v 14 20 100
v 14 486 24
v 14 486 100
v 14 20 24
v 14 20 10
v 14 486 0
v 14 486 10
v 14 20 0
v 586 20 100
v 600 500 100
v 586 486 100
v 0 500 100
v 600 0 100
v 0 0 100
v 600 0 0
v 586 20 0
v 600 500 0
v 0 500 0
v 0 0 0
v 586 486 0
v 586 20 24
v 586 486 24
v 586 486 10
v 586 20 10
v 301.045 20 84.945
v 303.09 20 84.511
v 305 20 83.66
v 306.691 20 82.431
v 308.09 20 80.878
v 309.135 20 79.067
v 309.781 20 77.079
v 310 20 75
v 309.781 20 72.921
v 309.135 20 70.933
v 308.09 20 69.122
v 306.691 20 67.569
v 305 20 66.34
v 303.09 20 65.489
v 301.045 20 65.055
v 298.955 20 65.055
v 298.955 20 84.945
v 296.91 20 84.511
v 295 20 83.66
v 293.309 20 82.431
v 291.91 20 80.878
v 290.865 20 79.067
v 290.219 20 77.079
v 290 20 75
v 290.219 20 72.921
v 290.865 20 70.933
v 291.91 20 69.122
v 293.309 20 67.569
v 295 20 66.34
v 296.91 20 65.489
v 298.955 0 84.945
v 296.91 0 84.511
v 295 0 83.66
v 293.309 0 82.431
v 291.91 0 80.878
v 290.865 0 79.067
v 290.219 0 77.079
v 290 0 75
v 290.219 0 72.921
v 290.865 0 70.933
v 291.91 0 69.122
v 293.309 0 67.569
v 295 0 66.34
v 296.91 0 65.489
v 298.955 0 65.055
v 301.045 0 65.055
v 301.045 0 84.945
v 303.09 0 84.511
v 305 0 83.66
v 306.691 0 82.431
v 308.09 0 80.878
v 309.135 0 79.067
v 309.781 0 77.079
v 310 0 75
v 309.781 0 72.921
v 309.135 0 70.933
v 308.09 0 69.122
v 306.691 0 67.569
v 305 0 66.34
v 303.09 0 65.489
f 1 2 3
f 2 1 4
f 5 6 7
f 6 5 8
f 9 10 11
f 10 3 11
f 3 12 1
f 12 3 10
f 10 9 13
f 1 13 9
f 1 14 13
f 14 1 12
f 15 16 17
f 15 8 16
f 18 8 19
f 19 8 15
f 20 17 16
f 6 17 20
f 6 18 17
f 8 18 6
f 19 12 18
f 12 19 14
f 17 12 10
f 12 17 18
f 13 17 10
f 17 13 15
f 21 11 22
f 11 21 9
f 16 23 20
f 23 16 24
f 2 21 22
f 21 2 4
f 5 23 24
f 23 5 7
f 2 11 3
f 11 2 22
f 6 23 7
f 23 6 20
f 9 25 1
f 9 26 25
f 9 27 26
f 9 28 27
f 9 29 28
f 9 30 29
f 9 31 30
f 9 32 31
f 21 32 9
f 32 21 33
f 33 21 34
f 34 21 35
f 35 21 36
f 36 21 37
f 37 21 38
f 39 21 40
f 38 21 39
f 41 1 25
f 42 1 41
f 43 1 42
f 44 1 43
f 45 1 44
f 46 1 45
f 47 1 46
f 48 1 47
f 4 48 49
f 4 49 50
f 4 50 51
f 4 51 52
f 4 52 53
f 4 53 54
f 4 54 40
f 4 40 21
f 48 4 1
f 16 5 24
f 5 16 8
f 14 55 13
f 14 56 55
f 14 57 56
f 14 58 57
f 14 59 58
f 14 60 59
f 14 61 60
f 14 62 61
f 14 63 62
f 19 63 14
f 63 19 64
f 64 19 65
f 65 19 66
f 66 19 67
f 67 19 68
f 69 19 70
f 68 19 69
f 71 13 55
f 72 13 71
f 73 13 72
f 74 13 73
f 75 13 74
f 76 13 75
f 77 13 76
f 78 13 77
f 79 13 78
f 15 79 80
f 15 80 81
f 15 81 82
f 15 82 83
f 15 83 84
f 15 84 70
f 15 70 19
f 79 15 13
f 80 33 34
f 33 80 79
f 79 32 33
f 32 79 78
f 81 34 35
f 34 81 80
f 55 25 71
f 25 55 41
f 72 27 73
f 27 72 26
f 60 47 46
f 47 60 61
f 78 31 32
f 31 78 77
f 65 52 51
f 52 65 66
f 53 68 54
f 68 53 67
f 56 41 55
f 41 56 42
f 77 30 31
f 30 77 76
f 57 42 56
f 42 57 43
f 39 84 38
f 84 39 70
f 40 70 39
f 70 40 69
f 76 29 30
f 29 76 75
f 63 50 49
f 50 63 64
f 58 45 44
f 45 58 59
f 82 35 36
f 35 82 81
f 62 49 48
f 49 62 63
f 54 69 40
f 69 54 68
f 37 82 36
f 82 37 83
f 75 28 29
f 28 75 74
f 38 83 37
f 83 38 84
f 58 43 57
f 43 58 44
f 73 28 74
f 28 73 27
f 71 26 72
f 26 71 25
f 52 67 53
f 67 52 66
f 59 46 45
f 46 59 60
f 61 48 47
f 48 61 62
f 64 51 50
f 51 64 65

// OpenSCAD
/*

    Dovetail Drawer
    
    By Anton Augustsson


*/

// use dovtail library

module dovetailDrawer (
    thicknessBottom,
    thicknessSide,
    thicknessFront,
    lenghtDrawer,
    widthDrawer,
    heightDrawer,
    xDrawer,yDrawer,zDrawer,
    yRotate
    ){
/*
    ---------- Local varibles ---------- 
*/

length = lenghtDrawer;
width  = widthDrawer;
height = heightDrawer;

x=xDrawer;
y=yDrawer;
z=zDrawer;

/*
    ---------- Code ---------- 
*/

translate([
    x,
    y,
    z]) 
rotate([0,yRotate,0])
difference () {
union () {

// Left
color("Wheat")
translate([
    0,
    thicknessFront/4,
    0]) 
cube(size = [
    thicknessSide,
    length-thicknessFront/4,
    height]);

// Right
color("Wheat")
translate([
    width-thicknessSide,
    thicknessFront/4,
    0]) 
cube(size = [
    thicknessSide,
    length-thicknessFront/4,
    height]);
    
// Bottom 
color("Wheat")
translate([
    thicknessSide/2,
    thicknessFront,
    10]) 
cube(size = [
    width-thicknessSide,
    length-thicknessFront-thicknessSide,
    thicknessBottom]);

// Back
color("Wheat")
translate([
    0,
    length-thicknessSide,
    0]) 
cube(size = [
    width,
    thicknessSide,
    height]);

// Front
color("BurlyWood")
translate([
    0,
    0,
    0]) 
cube(size = [
    width,
    thicknessFront,
    height]);    
}


translate([
    width/2,                   
    -1,   
    height/4*3
    ])  
rotate([270,0,0])
cylinder(
    h = thicknessFront+2,    
    r = 10        
    );      

}}
    
/*
    ---------- Example ---------- 
*/


thicknessBottom = 14;
thicknessSide   = 14;
thicknessFront  = 20;

length = 500;
width  = 600;
height = 100;


x=0;
y=0;
z=0;
yRotate=0;

dovetailDrawer (
    thicknessBottom,
    thicknessSide,
    thicknessFront,
    length,
    width,
    height,
    x,y,z,
    yRotate
    );
